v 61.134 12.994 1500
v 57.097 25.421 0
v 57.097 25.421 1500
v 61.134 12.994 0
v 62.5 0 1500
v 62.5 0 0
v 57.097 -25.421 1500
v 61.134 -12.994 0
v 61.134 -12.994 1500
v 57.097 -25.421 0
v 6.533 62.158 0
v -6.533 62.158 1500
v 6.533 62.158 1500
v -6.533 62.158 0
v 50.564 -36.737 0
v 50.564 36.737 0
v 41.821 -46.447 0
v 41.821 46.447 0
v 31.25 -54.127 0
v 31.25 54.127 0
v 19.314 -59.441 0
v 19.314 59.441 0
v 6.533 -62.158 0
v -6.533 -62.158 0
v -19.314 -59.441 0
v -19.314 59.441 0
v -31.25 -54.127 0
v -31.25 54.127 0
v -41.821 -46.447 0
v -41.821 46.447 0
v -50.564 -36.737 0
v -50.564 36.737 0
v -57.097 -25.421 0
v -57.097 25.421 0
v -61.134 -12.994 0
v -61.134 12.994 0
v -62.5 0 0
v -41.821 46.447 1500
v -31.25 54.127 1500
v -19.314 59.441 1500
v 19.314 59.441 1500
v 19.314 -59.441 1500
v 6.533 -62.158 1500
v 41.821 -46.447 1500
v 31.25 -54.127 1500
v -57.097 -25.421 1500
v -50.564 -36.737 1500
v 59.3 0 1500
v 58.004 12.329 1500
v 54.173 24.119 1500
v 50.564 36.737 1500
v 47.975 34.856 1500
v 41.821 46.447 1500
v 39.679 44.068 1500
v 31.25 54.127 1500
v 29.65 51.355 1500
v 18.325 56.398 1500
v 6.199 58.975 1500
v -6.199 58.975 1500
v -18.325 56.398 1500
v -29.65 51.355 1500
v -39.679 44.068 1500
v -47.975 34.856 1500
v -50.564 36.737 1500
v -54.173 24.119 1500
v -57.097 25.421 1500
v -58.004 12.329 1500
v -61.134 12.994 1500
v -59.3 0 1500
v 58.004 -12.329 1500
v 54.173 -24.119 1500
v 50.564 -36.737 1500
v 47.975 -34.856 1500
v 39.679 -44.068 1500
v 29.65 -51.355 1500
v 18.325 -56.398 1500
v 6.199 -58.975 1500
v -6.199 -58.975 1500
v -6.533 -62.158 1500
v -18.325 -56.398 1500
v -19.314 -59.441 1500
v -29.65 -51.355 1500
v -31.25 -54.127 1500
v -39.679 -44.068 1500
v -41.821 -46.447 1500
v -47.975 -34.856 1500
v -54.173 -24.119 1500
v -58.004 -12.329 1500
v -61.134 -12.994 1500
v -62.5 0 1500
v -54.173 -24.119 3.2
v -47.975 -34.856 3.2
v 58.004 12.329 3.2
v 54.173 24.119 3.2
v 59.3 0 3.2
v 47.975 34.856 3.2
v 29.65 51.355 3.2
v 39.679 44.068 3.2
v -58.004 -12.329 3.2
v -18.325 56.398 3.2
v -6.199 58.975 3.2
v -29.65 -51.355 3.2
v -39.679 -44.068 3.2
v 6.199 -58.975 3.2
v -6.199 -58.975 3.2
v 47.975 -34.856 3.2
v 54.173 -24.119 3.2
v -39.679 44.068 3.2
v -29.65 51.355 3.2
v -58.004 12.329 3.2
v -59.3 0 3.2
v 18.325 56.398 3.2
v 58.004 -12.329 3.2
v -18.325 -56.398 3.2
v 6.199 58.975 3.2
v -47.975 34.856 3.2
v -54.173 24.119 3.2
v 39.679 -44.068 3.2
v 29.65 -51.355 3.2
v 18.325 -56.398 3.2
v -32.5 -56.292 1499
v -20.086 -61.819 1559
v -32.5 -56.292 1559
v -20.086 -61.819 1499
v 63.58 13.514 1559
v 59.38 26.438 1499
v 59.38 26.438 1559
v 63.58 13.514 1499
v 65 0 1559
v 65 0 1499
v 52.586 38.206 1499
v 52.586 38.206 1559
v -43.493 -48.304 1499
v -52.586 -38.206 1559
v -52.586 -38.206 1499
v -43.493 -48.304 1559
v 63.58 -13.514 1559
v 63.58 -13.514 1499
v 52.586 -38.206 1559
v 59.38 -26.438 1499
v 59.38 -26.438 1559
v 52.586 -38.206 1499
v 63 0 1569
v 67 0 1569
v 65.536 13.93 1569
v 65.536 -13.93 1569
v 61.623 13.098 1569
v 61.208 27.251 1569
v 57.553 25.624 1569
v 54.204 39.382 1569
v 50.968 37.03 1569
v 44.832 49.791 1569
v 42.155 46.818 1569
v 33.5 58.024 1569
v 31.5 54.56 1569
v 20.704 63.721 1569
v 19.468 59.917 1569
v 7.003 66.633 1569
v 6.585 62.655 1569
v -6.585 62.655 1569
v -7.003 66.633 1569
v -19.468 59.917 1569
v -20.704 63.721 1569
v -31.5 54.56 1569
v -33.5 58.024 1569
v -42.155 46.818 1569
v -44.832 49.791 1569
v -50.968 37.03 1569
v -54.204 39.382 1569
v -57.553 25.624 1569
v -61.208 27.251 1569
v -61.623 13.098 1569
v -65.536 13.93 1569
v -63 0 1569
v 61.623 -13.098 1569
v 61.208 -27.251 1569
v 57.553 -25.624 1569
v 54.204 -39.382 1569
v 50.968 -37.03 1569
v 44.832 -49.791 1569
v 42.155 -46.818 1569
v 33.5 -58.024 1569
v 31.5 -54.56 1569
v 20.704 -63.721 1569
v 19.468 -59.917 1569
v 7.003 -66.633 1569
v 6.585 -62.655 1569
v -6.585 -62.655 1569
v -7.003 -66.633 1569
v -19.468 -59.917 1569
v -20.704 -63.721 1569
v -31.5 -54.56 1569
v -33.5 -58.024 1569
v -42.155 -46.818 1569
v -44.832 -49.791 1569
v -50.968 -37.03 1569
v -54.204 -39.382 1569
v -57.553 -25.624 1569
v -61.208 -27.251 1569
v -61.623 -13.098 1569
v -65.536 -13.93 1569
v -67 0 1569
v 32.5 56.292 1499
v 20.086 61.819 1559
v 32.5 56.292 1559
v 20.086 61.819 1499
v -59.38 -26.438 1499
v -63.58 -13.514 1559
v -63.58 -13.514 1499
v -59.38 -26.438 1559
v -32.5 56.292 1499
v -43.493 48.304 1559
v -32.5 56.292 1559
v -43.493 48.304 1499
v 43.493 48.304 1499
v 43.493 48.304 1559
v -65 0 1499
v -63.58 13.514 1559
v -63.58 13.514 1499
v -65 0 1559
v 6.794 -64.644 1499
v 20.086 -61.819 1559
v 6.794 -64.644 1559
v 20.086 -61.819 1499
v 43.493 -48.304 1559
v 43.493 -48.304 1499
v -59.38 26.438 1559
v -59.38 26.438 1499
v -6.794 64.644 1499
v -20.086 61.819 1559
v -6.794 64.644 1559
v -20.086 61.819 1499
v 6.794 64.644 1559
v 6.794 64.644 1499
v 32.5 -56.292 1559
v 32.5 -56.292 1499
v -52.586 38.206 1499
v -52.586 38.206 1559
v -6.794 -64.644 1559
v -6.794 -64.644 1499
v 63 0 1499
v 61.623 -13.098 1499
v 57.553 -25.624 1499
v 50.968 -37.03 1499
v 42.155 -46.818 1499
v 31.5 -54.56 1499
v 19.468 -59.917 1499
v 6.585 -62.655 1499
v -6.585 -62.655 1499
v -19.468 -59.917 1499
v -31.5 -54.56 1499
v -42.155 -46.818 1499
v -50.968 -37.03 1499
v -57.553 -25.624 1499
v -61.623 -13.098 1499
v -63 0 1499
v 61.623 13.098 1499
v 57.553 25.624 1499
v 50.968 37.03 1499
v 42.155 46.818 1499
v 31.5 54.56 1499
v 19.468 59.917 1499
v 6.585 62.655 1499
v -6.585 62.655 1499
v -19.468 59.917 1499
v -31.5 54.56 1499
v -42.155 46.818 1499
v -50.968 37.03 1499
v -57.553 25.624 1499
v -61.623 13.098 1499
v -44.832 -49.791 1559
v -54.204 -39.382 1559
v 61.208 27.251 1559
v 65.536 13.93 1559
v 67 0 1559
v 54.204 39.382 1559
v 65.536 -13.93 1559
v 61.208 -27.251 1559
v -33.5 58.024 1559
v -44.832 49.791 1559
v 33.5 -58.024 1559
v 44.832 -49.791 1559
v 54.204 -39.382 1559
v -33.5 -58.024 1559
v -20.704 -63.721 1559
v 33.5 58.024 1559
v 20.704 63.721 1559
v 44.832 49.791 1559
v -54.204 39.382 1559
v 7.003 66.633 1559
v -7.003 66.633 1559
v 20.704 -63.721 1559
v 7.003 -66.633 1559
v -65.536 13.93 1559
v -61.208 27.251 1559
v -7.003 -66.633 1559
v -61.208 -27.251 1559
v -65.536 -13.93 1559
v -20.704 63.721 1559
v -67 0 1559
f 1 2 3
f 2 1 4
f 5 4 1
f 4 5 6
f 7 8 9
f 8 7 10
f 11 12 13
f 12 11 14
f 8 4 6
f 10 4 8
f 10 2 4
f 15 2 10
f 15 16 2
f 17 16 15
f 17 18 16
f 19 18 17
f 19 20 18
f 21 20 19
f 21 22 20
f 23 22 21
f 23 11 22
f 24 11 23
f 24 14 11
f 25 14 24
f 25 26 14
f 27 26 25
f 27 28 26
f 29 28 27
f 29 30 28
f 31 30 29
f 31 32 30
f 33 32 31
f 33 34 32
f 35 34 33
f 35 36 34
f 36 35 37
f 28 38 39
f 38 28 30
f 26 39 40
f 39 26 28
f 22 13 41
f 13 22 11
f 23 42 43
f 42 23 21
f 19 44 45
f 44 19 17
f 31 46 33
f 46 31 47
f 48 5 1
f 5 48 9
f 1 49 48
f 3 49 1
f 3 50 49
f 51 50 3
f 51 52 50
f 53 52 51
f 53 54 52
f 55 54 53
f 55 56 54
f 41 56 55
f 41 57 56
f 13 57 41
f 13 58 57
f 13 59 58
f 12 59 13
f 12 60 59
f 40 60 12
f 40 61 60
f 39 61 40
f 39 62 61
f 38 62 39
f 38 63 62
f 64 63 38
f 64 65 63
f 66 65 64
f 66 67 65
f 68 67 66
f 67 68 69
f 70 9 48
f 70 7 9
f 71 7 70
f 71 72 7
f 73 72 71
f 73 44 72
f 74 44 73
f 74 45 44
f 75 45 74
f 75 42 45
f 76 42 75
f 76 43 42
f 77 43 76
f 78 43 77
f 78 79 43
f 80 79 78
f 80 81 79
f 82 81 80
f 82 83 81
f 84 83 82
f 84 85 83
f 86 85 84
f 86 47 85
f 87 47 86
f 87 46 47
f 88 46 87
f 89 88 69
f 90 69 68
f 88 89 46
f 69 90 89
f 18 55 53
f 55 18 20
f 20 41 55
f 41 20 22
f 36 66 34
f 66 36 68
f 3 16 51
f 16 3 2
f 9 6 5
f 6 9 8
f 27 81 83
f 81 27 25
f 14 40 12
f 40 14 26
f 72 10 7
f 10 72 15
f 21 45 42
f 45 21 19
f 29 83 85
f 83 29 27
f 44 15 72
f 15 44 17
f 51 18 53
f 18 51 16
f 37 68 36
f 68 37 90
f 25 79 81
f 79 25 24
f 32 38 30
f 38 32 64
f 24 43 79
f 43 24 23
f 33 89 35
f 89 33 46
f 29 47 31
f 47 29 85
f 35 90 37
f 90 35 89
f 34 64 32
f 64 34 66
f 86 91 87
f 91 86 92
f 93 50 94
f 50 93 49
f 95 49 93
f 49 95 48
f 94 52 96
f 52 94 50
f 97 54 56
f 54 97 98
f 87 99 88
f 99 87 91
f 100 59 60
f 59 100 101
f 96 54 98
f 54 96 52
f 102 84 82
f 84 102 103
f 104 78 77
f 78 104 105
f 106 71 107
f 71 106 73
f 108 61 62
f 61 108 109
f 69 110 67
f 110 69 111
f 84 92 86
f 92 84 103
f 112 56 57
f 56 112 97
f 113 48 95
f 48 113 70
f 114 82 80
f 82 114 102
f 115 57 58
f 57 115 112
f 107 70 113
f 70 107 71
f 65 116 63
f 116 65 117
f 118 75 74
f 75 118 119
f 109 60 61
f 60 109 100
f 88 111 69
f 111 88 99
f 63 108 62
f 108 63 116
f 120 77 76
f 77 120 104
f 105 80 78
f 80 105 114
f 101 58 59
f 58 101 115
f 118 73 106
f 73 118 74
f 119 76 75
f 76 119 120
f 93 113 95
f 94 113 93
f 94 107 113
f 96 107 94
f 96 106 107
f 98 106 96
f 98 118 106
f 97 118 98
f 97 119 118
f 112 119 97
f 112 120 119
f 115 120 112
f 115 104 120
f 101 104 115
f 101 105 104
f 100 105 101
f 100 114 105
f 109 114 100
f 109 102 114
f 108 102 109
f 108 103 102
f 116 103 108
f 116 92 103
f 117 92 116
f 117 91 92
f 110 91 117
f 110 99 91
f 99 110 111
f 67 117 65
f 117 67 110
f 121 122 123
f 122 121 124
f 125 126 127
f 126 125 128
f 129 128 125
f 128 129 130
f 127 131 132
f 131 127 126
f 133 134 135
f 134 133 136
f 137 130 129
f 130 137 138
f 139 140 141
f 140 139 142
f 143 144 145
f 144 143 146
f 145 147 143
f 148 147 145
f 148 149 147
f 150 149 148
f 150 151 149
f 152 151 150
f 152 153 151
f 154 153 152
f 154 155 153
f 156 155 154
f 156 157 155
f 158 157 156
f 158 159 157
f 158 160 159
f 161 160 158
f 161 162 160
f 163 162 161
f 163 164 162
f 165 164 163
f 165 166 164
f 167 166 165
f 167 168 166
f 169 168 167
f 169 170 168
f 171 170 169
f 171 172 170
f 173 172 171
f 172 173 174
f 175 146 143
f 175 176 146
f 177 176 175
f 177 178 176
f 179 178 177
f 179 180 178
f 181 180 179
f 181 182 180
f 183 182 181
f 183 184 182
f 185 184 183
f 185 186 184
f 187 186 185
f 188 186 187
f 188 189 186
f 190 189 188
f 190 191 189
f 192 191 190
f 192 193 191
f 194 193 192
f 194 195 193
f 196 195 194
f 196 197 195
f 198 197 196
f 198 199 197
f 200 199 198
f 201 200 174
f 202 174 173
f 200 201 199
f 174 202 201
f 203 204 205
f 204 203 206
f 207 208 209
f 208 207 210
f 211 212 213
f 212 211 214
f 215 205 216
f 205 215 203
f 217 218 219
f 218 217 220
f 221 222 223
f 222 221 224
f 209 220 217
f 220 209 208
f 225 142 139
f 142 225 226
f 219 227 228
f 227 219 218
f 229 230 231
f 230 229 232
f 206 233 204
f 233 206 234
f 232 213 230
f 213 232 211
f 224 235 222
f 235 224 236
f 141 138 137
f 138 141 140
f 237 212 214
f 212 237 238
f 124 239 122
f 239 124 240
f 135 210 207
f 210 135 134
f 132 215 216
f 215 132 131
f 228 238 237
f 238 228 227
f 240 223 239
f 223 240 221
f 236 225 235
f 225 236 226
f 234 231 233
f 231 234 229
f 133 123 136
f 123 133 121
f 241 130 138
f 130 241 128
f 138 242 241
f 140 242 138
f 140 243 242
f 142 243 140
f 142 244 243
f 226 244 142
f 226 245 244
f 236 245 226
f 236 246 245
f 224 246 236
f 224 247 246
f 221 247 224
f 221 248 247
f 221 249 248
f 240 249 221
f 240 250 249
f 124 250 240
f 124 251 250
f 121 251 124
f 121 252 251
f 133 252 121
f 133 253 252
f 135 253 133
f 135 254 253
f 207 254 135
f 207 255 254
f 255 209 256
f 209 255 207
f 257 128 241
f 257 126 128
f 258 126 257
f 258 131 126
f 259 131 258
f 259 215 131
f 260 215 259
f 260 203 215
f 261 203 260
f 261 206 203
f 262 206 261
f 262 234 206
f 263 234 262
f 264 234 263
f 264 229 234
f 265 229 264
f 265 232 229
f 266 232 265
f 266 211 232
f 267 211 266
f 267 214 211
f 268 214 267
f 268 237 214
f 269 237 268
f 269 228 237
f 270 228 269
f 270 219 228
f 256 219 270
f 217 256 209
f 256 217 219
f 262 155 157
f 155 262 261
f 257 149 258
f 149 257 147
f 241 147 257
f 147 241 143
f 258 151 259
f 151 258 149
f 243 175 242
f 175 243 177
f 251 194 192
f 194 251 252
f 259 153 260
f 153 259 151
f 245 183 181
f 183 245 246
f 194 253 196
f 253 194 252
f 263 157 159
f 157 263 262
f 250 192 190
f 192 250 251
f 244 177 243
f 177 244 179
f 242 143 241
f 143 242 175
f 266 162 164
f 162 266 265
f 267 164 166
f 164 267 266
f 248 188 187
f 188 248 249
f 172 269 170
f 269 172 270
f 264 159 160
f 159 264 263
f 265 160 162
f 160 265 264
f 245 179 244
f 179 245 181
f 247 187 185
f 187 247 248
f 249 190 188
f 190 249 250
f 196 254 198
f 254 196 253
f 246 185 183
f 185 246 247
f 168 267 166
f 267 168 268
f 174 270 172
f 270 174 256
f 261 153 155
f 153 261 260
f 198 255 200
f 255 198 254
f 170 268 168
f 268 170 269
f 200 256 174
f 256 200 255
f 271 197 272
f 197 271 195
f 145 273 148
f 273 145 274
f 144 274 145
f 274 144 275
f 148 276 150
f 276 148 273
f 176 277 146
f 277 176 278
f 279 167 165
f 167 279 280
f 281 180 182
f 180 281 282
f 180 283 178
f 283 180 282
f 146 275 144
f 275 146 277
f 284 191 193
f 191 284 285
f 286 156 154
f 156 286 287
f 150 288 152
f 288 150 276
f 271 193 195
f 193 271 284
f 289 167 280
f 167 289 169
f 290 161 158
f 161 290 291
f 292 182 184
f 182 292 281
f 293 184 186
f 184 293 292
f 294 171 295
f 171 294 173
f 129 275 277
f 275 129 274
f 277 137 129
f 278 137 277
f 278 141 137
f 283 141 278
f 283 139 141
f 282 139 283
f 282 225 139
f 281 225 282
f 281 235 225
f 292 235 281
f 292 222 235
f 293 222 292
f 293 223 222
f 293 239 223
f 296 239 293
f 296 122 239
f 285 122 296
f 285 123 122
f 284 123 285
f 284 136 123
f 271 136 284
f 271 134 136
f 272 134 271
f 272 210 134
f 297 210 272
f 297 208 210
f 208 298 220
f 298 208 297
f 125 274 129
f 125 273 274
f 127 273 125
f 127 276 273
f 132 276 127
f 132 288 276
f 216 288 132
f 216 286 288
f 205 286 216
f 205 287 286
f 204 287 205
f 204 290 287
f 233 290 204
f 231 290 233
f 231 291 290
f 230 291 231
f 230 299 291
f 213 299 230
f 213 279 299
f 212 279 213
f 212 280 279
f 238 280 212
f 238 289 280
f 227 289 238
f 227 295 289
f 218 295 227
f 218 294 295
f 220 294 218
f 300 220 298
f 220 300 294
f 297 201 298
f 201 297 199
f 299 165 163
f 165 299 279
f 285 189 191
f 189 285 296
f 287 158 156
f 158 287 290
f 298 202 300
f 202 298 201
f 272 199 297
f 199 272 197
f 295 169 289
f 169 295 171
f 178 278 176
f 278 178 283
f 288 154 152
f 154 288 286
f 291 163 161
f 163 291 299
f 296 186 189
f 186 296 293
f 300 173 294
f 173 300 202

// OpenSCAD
// Parameters
pipe_standard = 1; //[1:1:1]
nominal_diameter_mm = 125; //[60:250:1]
length_mm = 1500; //[750:3000:10]
include_end_fitting = 1; //[0:1:1]
od_mm = 125; //[60:250:1]
wall_thickness_mm = 3.2; //[1.6:6.4:0.1]
clearance_mm = 0.5; //[0.2:1.5:0.1]
overlap_mm = 1; //[0.5:2:0.1]
fitting_length_mm = 70; //[35:140:1]
fitting_wall_extra_mm = 2.5; //[1:6:0.1]
fitting_stop_thickness_mm = 4; //[2:10:0.5]
fitting_stop_length_mm = 10; //[5:25:1]

// HT Pipe - complete geometry
module ht_pipe() {
  color([0.85, 0.85, 0.8]) {
    // Hollow Tube Body
    difference() {
      cylinder(r=od_mm/2, h=length_mm, center=false);
      translate([0, 0, wall_thickness_mm])
        cylinder(r=od_mm/2 - wall_thickness_mm, h=length_mm, center=false);
    }
    
    // End Fitting
    if (include_end_fitting) {
      union() {
        // End Fitting Shell
        difference() {
          translate([0, 0, length_mm - overlap_mm])
            cylinder(r=od_mm/2 + fitting_wall_extra_mm, h=fitting_length_mm, center=false);
          translate([0, 0, length_mm - overlap_mm])
            cylinder(r=od_mm/2 + clearance_mm, h=fitting_length_mm, center=false);
        }
        
        // End Fitting Stop Ring
        difference() {
          translate([0, 0, length_mm - overlap_mm + fitting_length_mm - fitting_stop_length_mm])
            cylinder(r=od_mm/2 + clearance_mm + fitting_stop_thickness_mm, h=fitting_stop_length_mm, center=false);
          translate([0, 0, length_mm - overlap_mm + fitting_length_mm - fitting_stop_length_mm])
            cylinder(r=od_mm/2 + clearance_mm, h=fitting_stop_length_mm, center=false);
        }
      }
    }
  }
}

// Assembly
module assembly() {
  ht_pipe();
}

assembly();
